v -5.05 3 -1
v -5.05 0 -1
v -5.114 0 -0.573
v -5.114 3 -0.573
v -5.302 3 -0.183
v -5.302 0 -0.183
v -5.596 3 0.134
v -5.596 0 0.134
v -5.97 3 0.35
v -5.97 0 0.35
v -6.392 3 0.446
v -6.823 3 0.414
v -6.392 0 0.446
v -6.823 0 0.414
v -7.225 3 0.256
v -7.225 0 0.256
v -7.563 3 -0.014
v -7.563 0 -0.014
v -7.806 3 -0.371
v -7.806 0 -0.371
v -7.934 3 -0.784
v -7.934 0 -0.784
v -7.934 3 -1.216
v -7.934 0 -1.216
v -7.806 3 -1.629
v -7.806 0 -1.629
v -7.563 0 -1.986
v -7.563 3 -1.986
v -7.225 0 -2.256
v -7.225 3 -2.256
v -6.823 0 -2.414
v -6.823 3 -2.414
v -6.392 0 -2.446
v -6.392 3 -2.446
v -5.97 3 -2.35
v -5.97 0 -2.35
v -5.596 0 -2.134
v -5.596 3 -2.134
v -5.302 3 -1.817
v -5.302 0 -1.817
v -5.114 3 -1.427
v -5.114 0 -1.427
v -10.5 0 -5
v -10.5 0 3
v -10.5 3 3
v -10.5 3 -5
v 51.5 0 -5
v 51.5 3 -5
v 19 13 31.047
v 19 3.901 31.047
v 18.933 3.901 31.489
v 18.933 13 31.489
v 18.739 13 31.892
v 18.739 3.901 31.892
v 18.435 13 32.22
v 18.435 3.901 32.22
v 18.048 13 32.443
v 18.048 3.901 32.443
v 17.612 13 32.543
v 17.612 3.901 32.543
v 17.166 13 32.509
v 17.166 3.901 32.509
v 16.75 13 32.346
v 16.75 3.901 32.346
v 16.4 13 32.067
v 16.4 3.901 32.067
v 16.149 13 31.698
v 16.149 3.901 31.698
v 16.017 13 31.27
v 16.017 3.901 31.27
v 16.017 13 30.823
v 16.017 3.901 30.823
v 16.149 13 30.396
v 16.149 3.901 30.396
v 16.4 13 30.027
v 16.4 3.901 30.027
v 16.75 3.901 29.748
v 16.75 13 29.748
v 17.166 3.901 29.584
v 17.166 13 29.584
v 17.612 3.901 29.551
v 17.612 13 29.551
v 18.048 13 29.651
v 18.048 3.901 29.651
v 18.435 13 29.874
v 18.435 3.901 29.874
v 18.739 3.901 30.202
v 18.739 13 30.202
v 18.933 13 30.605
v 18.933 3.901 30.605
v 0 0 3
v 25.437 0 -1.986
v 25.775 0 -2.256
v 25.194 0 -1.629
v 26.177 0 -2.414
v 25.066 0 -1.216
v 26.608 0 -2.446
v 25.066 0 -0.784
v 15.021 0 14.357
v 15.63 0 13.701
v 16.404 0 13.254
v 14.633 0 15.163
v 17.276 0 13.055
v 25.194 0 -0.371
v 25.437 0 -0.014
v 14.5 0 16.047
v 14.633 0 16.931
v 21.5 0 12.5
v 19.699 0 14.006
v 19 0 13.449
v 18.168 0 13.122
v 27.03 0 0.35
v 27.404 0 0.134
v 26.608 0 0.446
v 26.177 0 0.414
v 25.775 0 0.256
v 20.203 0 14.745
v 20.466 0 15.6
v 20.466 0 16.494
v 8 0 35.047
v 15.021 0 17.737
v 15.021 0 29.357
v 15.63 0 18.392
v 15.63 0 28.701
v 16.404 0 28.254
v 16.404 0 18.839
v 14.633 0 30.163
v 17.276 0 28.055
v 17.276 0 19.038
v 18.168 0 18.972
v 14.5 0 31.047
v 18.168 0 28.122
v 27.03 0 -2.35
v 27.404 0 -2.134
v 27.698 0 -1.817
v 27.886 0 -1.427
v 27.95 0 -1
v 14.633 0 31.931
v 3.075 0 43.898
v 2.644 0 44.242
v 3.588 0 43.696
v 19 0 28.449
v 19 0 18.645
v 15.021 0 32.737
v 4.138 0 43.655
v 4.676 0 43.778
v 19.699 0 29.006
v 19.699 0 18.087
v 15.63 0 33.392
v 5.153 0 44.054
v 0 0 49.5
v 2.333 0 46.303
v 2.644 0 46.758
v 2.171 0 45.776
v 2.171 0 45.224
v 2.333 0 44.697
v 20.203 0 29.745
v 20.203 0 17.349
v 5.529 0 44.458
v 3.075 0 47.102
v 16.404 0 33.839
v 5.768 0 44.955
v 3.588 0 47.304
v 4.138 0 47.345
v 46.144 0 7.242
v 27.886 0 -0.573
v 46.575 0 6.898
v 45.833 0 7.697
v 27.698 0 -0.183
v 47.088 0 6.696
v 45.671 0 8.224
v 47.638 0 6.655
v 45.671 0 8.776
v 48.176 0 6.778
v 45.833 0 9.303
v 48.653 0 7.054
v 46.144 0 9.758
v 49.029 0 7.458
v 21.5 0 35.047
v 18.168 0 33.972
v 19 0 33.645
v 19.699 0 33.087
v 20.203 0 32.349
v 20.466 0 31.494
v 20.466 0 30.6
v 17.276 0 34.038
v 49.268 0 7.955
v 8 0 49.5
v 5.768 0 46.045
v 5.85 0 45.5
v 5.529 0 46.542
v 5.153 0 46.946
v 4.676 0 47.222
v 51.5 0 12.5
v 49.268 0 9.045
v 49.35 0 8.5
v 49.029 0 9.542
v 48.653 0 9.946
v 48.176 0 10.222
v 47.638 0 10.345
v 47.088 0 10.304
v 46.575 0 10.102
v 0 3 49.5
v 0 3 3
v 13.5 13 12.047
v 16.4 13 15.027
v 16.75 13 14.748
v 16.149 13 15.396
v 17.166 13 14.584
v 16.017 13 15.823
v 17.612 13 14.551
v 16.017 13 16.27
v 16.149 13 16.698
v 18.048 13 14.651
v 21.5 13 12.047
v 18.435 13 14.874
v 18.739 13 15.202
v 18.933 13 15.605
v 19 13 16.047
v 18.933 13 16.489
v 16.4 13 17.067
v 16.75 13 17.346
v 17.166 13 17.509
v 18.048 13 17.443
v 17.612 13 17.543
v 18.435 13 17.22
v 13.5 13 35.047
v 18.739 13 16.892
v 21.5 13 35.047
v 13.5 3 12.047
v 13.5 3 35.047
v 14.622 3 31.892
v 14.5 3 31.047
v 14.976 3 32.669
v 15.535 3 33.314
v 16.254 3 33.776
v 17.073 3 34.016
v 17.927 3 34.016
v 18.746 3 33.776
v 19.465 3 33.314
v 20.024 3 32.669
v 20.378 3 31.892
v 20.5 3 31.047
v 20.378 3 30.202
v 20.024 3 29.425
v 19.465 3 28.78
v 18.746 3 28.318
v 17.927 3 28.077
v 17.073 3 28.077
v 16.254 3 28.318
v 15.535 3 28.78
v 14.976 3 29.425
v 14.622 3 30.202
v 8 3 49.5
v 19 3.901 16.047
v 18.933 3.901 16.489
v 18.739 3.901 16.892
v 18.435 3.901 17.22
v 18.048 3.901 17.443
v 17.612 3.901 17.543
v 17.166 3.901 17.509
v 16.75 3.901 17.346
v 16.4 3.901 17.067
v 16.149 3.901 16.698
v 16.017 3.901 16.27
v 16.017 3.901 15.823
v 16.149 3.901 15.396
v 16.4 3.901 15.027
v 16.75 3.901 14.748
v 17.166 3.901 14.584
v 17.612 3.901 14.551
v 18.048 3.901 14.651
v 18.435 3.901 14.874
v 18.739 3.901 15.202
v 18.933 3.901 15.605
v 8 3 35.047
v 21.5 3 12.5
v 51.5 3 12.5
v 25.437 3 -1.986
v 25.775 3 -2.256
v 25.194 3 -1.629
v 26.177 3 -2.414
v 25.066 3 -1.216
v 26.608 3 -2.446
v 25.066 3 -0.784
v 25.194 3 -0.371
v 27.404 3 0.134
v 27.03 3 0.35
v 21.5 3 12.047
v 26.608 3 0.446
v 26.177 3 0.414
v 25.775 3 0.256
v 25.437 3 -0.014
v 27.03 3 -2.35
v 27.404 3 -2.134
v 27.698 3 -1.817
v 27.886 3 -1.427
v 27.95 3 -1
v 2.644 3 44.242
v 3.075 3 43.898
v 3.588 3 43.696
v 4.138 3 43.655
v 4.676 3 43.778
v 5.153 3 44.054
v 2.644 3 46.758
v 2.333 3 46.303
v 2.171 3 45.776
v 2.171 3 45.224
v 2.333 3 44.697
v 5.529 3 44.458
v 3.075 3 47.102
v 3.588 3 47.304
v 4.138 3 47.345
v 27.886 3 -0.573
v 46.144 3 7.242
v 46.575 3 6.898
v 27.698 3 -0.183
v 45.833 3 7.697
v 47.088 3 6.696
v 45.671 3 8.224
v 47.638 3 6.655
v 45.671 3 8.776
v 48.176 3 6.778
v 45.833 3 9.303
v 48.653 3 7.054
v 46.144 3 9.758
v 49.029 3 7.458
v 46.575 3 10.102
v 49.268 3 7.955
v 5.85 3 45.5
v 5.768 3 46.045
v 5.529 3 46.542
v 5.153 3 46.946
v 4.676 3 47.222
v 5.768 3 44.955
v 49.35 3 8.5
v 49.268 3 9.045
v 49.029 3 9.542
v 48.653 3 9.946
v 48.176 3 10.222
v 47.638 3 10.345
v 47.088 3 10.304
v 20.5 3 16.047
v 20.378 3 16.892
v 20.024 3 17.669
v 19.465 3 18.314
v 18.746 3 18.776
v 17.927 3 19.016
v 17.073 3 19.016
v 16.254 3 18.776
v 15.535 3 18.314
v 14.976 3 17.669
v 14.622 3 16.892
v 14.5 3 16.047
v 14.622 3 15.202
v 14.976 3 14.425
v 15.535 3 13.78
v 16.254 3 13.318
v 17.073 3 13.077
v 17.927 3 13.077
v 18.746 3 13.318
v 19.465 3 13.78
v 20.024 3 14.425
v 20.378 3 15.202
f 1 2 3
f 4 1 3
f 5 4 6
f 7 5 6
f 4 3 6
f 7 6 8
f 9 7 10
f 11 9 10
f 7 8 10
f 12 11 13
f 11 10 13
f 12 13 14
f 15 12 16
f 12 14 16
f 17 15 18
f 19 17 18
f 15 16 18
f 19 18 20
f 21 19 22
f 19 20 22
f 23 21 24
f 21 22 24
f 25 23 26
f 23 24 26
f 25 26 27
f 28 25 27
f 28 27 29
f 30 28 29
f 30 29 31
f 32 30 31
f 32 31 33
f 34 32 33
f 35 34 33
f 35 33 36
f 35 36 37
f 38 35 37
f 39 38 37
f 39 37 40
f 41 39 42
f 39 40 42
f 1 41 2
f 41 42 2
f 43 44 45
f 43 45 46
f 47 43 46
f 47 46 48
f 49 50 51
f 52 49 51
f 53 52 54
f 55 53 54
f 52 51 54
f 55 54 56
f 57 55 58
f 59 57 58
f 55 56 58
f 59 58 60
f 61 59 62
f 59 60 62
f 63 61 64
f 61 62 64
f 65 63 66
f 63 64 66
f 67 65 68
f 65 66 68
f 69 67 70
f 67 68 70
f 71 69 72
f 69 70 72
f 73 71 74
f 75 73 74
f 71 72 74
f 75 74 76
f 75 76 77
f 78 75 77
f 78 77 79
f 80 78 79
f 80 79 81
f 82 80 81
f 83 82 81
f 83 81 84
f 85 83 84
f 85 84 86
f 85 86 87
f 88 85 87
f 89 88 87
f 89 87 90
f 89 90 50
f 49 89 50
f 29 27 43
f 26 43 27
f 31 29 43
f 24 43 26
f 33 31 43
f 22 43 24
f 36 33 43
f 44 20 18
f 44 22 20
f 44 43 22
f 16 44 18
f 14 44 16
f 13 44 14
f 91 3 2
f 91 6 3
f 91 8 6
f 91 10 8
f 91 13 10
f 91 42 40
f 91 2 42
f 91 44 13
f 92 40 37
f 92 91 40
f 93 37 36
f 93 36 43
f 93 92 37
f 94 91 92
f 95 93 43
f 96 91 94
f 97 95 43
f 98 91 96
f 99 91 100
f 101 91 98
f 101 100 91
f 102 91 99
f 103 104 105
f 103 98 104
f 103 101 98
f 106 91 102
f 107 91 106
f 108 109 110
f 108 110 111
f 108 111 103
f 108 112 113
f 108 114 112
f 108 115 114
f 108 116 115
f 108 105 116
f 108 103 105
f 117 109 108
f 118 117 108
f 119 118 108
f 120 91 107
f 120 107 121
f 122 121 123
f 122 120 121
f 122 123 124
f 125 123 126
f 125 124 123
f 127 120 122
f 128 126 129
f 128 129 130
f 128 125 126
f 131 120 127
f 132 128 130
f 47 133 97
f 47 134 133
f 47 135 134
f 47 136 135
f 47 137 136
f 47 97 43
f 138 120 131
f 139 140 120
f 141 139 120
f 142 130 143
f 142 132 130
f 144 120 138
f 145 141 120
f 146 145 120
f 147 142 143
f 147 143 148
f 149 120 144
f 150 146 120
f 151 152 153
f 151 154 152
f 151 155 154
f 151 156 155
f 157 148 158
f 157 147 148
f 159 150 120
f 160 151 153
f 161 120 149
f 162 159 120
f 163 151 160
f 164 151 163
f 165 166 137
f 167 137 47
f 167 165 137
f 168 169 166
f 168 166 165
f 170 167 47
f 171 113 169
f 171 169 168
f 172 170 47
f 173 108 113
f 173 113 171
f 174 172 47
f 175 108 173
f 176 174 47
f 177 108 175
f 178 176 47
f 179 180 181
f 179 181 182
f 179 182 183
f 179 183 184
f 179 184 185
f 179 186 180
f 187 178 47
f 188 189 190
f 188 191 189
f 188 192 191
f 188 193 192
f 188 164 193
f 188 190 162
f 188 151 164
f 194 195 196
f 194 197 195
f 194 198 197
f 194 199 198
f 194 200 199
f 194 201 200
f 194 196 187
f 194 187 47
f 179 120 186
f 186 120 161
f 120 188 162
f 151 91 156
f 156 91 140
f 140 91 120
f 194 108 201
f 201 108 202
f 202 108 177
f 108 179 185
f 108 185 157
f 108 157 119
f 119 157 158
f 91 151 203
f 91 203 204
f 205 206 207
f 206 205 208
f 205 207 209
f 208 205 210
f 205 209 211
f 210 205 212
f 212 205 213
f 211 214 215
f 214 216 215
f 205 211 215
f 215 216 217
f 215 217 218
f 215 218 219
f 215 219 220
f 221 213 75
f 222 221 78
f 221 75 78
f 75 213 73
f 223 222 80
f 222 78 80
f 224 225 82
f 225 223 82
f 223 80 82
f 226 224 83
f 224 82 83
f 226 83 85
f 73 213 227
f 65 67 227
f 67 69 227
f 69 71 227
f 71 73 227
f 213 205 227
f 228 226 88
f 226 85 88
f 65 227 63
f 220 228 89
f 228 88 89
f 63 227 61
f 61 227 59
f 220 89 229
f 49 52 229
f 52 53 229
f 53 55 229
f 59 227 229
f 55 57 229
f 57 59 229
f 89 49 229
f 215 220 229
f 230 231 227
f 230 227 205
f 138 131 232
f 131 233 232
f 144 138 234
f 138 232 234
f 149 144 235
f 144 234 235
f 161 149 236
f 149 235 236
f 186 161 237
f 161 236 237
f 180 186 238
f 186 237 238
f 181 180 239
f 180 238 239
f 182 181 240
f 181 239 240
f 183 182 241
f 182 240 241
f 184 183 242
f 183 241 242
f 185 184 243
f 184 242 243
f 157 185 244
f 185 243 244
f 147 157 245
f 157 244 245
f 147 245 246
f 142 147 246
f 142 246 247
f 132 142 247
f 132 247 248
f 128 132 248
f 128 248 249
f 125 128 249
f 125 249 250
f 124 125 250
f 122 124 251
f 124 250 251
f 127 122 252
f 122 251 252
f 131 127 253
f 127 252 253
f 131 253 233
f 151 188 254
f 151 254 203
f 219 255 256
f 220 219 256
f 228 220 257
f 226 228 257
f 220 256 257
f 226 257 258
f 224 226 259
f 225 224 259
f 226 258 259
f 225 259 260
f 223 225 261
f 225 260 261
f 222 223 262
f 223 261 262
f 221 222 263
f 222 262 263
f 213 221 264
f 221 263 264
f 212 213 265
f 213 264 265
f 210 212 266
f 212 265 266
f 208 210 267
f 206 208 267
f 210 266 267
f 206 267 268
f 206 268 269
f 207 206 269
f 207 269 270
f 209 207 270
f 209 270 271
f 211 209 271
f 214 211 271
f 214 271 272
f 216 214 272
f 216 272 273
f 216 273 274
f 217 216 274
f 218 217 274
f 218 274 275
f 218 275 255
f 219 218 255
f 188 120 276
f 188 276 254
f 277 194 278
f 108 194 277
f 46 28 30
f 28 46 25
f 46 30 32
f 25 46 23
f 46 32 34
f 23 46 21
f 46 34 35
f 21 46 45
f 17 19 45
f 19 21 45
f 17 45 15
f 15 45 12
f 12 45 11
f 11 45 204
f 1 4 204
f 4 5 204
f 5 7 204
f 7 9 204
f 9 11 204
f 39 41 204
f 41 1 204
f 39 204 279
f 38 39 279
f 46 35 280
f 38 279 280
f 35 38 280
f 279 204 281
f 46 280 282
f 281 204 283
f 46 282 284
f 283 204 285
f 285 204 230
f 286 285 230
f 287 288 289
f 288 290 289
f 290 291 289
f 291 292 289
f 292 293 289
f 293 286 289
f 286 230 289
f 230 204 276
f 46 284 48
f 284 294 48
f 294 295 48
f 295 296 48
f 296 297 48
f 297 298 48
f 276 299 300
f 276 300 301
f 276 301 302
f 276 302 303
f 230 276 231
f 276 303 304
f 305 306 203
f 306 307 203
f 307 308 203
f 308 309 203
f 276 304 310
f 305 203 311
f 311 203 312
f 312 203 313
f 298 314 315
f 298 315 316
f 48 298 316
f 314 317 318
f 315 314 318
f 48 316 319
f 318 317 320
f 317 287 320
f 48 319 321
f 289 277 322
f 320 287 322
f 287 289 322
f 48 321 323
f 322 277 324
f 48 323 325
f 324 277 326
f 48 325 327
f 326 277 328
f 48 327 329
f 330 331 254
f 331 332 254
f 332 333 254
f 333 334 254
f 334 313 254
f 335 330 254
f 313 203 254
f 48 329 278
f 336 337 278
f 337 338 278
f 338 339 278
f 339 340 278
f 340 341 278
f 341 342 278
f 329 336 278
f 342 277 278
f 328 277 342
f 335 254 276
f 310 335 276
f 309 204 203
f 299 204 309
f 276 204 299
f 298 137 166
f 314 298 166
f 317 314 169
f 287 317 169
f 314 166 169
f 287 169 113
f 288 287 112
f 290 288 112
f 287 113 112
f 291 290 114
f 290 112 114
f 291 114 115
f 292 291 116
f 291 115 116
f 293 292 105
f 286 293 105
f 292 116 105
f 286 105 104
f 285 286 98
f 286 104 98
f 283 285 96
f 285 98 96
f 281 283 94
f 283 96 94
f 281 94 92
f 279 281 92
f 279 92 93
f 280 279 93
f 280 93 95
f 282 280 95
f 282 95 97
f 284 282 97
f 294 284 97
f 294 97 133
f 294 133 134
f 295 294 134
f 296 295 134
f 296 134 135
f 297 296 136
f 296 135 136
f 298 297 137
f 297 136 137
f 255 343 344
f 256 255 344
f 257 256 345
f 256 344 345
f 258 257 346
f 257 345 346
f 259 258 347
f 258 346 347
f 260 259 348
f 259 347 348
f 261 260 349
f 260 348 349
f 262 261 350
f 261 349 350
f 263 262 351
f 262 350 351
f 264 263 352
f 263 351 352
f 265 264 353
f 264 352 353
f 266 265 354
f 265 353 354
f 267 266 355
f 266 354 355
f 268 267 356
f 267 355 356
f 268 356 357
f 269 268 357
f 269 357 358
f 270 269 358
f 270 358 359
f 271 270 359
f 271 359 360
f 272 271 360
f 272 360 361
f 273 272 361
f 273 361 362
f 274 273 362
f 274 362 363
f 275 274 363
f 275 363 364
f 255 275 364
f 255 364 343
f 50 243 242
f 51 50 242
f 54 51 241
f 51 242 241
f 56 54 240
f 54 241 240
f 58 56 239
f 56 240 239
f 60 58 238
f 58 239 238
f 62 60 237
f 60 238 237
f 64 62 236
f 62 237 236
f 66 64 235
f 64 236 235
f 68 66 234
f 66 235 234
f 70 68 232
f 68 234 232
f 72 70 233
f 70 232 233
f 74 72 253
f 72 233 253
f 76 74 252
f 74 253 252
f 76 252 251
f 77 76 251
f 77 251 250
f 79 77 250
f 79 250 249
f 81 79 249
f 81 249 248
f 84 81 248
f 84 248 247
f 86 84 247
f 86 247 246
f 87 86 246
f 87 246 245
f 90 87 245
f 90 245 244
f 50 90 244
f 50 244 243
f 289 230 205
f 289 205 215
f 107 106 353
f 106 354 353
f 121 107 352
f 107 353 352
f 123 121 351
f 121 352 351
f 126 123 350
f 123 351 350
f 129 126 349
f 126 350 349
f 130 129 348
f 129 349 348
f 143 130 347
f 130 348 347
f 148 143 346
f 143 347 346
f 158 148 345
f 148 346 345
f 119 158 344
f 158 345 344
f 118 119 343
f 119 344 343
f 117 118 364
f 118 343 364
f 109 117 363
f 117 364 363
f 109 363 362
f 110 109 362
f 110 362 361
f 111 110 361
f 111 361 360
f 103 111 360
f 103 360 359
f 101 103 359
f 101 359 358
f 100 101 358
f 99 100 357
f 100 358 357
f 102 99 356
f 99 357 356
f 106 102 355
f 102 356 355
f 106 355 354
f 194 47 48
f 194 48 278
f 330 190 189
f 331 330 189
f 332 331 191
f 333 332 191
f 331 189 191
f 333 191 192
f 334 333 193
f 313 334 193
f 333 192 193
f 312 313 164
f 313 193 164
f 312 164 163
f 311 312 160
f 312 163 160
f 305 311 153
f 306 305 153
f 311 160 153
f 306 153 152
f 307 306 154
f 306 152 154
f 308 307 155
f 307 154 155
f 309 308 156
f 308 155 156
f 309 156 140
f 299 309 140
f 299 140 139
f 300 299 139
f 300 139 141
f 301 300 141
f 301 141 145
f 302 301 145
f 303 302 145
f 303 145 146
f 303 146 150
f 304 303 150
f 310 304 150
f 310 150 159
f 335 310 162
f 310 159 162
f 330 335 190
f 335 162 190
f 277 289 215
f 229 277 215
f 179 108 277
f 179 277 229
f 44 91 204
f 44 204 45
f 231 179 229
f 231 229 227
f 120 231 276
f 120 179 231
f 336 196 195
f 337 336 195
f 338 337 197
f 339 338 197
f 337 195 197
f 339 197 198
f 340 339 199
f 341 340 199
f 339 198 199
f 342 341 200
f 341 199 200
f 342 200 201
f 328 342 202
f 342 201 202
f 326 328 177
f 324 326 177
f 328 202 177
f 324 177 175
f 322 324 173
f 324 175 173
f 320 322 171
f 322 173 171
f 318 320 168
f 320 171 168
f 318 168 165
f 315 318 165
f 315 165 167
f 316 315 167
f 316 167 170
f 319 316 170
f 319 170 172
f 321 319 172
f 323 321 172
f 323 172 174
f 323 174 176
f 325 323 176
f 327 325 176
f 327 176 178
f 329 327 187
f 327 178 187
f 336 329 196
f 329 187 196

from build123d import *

# Parameters (mm, degrees)
F0_R     = 1.45
F0_R_2   = 1.85
F0_R_3   = 1.5
F1_DEPTH = 3
F2_DEPTH = 13
F3_D     = 6
F3_DEPTH = 3
F3_TIP   = 1.8025818571


with BuildPart() as f1:
    # F0 (on Front) → F1 (new body)
    with BuildSketch(Plane.XZ):
        Polygon((-10.5, -5), (51.5, -5), (51.5, 12.5), (21.5, 12.5), (21.5, 12.0468574613), (13.5, 12.0468574613), (13.5, 35.0468574613), (8, 35.0468574613), (8, 49.5), (0, 49.5), (0, 3), (-10.5, 3), align=None)
        with Locations((-6.5, -1)):
            Circle(F0_R, mode=Mode.SUBTRACT)
        with Locations((26.5, -1)):
            Circle(F0_R, mode=Mode.SUBTRACT)
        with Locations((47.5, 8.5)):
            Circle(F0_R_2, mode=Mode.SUBTRACT)
        with Locations((4, 45.5)):
            Circle(F0_R_2, mode=Mode.SUBTRACT)
        Polygon((21.5, 12.0468574613), (21.5, 12.5), (21.5, 35.0468574613), (13.5, 35.0468574613), (13.5, 12.0468574613), align=None)
        with Locations((17.5, 16.0468574613)):
            Circle(F0_R_3, mode=Mode.SUBTRACT)
        with Locations((17.5, 31.0468574613)):
            Circle(F0_R_3, mode=Mode.SUBTRACT)
    extrude(amount=-F1_DEPTH)

    # F0 (on Front) → F2 (join)
    with BuildSketch(Plane.XZ):
        Polygon((21.5, 12.0468574613), (21.5, 12.5), (21.5, 35.0468574613), (13.5, 35.0468574613), (13.5, 12.0468574613), align=None)
        with Locations((17.5, 16.0468574613)):
            Circle(F0_R_3, mode=Mode.SUBTRACT)
        with Locations((17.5, 31.0468574613)):
            Circle(F0_R_3, mode=Mode.SUBTRACT)
    extrude(amount=-F2_DEPTH)

    # F3
    with Locations(Plane.XZ):
        with Locations((17.5, 31.0468574613), (17.5, 16.0468574613)):
            Hole(F3_D / 2, depth=F3_DEPTH)
            with Locations((0, 0, -(F3_DEPTH + F3_TIP / 2))):  # 118° drill point
                Cone(0, F3_D / 2, F3_TIP, mode=Mode.SUBTRACT)


solid = f1.part
